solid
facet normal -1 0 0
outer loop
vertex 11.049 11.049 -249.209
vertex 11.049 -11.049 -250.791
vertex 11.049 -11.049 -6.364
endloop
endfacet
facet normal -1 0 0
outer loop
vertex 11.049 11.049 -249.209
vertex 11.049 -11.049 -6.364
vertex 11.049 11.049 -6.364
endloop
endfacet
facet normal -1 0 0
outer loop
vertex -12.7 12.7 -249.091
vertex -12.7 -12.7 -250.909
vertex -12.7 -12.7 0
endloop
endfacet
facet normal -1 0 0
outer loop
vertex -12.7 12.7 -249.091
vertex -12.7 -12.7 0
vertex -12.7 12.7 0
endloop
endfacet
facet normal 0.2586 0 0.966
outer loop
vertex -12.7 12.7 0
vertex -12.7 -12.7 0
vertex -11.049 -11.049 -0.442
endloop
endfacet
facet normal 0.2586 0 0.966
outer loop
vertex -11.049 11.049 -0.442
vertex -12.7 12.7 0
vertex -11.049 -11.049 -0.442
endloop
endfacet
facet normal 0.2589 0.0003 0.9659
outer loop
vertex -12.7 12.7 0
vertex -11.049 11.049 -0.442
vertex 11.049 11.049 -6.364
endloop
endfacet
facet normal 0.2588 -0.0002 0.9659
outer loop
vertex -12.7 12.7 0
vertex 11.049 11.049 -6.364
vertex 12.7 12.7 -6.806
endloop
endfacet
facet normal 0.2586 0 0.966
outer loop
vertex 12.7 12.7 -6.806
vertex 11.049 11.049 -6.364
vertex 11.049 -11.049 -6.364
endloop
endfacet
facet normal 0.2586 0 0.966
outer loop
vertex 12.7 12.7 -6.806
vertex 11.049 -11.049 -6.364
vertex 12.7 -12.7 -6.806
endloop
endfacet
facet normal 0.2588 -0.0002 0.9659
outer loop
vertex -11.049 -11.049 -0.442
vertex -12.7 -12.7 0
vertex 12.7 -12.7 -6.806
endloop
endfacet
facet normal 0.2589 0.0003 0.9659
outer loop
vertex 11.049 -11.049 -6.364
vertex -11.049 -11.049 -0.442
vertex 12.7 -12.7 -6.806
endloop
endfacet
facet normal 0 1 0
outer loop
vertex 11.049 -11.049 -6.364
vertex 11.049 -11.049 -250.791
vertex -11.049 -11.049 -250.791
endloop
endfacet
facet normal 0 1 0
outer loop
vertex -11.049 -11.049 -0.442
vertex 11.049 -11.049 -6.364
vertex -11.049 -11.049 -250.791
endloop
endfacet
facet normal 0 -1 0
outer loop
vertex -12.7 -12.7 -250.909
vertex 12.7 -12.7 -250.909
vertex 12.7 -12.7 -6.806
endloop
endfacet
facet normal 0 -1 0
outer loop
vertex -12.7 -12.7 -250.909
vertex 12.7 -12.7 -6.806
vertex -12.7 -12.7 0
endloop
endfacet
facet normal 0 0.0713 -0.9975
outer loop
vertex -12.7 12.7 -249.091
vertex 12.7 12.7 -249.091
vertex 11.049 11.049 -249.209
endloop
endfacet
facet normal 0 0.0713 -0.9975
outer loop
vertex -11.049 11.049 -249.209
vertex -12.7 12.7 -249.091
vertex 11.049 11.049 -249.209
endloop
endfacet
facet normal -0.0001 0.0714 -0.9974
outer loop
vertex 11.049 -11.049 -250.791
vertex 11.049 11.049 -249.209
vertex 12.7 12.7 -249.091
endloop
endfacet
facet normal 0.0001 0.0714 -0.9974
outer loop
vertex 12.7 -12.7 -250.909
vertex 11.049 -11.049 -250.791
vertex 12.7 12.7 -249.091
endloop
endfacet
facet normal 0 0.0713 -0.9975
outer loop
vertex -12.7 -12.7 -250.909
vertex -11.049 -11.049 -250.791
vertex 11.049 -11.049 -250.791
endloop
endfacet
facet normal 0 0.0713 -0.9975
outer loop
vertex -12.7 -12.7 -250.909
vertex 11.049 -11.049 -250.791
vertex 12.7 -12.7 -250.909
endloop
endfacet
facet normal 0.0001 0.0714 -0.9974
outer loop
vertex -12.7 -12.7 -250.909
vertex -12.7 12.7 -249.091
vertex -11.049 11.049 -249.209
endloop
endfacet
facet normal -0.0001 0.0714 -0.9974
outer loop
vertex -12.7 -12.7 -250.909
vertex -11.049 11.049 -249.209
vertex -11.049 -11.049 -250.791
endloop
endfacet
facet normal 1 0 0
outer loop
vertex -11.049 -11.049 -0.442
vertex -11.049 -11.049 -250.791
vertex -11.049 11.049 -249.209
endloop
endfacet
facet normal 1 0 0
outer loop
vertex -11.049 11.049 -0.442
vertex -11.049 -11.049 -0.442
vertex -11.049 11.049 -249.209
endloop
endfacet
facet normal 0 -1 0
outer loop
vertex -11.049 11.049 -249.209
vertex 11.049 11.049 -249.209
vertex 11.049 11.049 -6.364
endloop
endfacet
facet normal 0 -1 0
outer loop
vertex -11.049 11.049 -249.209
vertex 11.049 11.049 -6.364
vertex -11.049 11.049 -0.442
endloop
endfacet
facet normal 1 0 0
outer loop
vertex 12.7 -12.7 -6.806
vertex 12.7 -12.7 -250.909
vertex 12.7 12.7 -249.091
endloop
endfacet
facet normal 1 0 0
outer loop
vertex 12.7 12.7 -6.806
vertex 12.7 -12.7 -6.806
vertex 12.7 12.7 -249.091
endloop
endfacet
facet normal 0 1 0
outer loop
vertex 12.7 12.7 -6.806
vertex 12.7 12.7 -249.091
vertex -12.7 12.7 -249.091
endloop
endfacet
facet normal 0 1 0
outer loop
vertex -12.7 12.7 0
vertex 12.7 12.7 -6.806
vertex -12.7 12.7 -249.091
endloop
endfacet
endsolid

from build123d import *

# Parameters (mm, degrees)
SKETCH1_W           = 25.4
SKETCH1_H           = 25.4
SKETCH1_W_2         = 22.098
SKETCH1_H_2         = 22.098
BOSS_EXTRUDE1_DEPTH = 250
SKETCH5_W           = 25.4
SKETCH5_H           = 25.4
SKETCH5_W_2         = 22.098
SKETCH5_H_2         = 22.098
BOSS_EXTRUDE2_DEPTH = 25.4
CUT_EXTRUDE1_DEPTH  = 165.021579309
CUT_EXTRUDE2_DEPTH  = 26.4


with BuildPart() as part:
    # Sketch1 → Boss-Extrude1 (new body)
    with BuildSketch(Plane.XY):
        Rectangle(SKETCH1_W, SKETCH1_H)
        Rectangle(SKETCH1_W_2, SKETCH1_H_2, mode=Mode.SUBTRACT)
    extrude(amount=-BOSS_EXTRUDE1_DEPTH)

    # Sketch5 → Boss-Extrude2 (add)
    with BuildSketch(Plane(origin=(0, 0, -250), x_dir=(-1, 0, 0), z_dir=(0, 0, -1))):
        Rectangle(SKETCH5_W, SKETCH5_H)
        Rectangle(SKETCH5_W_2, SKETCH5_H_2, mode=Mode.SUBTRACT)
    extrude(amount=BOSS_EXTRUDE2_DEPTH)

    # Sketch6 → Cut-Extrude1 (cut, through all)
    with BuildSketch(Plane(origin=(-151.321579309, -359.319373916, -111.97168159), x_dir=(0, 0, 1), z_dir=(1, 0, 0))):
        Polygon((-136.210945072, -384.704102096), (-139.845691747, -333.934645736), (-224.95481734, -363.340122949), align=None)
    extrude(amount=CUT_EXTRUDE1_DEPTH, mode=Mode.SUBTRACT)

    # Sketch7 → Cut-Extrude2 (cut, through all)
    with BuildSketch(Plane.XZ.offset(12.7)):
        Polygon((-12.7, 0), (24.645207819, -10.006618276), (24.645207819, 0), align=None)
    extrude(amount=-CUT_EXTRUDE2_DEPTH, mode=Mode.SUBTRACT)


solid = part.part
